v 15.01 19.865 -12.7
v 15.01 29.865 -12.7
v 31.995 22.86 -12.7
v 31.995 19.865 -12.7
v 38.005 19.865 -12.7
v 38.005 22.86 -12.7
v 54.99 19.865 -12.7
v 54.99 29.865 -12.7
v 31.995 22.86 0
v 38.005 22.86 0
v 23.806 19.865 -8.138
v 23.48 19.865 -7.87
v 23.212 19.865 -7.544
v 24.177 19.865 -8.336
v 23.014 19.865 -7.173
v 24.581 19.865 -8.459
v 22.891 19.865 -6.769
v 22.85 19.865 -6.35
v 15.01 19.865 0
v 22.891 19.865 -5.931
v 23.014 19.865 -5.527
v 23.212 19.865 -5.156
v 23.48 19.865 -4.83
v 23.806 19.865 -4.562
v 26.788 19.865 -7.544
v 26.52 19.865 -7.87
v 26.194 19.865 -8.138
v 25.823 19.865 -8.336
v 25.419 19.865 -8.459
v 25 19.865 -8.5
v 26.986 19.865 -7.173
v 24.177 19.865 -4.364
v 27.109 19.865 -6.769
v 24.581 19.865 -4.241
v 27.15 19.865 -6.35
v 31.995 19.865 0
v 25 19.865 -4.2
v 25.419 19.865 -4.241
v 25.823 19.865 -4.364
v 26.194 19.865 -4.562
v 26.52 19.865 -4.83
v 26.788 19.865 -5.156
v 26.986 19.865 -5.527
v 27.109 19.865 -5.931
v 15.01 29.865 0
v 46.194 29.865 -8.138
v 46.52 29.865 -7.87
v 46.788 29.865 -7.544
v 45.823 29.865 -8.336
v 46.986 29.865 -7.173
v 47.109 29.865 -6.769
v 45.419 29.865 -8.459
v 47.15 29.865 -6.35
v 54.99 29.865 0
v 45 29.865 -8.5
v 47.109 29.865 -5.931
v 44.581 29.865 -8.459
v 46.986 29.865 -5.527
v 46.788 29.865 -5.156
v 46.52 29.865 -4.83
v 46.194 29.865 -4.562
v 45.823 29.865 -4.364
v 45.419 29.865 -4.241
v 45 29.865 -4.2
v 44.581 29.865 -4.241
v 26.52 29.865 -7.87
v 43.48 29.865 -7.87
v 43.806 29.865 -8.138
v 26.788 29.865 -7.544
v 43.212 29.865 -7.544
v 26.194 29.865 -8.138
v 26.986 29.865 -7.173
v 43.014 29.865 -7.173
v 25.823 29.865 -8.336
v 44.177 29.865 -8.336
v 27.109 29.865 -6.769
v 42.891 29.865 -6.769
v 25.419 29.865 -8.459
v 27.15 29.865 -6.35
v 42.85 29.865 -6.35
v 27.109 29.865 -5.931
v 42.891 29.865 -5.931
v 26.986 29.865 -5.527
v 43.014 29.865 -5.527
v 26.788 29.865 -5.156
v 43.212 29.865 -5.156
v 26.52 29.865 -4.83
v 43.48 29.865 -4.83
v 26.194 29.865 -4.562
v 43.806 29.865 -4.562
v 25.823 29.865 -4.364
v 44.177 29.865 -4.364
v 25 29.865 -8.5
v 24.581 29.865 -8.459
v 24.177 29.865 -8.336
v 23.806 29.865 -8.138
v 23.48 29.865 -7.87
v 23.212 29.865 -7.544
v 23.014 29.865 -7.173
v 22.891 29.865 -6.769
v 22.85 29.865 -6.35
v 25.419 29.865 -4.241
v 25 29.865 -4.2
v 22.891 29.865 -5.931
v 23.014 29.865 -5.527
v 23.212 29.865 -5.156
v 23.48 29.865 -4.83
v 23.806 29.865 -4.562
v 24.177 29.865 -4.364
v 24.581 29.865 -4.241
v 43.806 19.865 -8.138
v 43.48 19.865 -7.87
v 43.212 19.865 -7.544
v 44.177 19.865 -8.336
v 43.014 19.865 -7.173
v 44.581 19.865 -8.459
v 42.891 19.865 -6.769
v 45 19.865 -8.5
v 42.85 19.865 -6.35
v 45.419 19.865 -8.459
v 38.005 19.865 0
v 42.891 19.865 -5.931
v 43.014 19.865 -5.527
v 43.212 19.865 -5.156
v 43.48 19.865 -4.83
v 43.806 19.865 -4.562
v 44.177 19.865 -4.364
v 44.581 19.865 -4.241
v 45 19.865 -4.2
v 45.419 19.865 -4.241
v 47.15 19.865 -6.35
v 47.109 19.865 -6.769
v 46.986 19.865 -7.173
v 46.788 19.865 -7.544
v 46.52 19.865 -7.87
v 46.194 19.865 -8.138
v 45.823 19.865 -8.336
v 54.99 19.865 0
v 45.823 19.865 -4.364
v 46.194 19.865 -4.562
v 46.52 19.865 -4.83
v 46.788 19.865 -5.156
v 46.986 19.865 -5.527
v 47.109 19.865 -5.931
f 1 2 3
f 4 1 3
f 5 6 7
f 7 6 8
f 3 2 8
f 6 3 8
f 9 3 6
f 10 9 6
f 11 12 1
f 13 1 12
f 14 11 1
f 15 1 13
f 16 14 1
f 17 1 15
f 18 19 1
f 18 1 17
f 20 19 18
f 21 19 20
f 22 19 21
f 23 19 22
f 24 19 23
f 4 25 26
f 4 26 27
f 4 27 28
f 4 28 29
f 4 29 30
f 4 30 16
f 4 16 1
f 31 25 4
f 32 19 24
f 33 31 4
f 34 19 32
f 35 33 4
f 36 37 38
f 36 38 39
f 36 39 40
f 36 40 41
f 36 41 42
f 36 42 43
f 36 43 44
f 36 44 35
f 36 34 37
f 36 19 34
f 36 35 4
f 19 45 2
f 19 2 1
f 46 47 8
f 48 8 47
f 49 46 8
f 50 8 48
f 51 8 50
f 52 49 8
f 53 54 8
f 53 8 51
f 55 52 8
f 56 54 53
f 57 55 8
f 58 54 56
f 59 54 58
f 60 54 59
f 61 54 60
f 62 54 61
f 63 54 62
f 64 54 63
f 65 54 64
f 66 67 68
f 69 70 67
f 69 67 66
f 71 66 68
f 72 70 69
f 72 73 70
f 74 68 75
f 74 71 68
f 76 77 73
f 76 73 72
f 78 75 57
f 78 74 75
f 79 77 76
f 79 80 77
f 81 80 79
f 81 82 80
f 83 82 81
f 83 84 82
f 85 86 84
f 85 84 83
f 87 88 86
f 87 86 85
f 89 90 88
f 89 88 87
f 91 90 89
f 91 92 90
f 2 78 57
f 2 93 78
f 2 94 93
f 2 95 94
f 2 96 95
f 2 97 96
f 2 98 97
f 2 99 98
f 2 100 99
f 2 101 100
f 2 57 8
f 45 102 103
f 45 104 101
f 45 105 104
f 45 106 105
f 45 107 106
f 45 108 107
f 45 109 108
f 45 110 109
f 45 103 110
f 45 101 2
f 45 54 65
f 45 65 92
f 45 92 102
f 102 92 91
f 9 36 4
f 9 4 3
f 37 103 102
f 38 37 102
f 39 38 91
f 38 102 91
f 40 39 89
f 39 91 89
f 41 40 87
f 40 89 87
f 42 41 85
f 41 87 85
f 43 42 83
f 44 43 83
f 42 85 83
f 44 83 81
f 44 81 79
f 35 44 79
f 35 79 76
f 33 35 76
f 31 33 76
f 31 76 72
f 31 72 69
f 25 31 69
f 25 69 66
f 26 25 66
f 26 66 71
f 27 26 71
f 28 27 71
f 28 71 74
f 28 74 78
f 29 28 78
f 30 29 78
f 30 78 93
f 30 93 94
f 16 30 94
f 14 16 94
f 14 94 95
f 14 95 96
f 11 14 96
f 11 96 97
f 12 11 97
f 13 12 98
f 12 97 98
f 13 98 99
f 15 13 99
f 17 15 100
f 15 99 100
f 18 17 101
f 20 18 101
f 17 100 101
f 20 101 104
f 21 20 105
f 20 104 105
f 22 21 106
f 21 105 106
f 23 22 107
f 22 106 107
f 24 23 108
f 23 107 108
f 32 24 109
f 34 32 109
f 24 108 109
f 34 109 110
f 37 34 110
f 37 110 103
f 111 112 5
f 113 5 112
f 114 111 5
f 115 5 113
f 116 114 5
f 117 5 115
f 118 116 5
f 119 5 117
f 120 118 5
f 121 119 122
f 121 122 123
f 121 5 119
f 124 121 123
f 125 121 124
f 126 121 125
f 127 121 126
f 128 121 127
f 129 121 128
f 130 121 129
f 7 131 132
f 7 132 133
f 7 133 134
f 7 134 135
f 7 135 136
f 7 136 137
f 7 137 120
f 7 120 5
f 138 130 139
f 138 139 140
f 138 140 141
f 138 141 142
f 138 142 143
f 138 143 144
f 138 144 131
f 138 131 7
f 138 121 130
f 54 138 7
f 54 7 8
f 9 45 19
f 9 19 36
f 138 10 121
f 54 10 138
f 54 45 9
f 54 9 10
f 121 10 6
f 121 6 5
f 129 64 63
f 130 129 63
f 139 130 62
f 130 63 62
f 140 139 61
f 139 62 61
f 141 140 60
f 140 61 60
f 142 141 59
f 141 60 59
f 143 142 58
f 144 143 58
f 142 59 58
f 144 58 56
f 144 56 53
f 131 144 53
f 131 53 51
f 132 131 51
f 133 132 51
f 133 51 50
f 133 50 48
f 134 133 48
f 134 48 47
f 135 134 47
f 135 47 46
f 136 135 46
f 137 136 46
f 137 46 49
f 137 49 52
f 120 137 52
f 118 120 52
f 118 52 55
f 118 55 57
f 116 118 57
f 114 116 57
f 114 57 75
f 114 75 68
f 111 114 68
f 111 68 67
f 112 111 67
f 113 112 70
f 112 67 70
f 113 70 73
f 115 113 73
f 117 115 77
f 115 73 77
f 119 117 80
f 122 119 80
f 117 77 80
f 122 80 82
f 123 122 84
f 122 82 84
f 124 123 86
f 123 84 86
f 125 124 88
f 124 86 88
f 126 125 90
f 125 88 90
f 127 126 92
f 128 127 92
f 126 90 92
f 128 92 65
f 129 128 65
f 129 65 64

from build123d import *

# Parameters (mm, degrees)
BOSS_EXTRUDE1_DEPTH  = 12.7
M4_CLEARANCE_HOLE1_D = 4.3


with BuildPart() as part:
    # Sketch1 → Boss-Extrude1 (new body)
    with BuildSketch(Plane.XY):
        Polygon((54.99, 29.865), (15.01, 29.865), (15.01, 19.865), (31.995, 19.865), (31.995, 22.86), (38.005, 22.86), (38.005, 19.865), (54.99, 19.865), align=None)
    extrude(amount=-BOSS_EXTRUDE1_DEPTH)

    # M4 Clearance Hole1 (through all)
    with Locations(Plane(origin=(25, 19.865, -6.35), x_dir=(0, 0, -1), z_dir=(0, -1, 0))):
        with Locations((0, 0), (0, 20)):
            Hole(M4_CLEARANCE_HOLE1_D / 2)


solid = part.part
